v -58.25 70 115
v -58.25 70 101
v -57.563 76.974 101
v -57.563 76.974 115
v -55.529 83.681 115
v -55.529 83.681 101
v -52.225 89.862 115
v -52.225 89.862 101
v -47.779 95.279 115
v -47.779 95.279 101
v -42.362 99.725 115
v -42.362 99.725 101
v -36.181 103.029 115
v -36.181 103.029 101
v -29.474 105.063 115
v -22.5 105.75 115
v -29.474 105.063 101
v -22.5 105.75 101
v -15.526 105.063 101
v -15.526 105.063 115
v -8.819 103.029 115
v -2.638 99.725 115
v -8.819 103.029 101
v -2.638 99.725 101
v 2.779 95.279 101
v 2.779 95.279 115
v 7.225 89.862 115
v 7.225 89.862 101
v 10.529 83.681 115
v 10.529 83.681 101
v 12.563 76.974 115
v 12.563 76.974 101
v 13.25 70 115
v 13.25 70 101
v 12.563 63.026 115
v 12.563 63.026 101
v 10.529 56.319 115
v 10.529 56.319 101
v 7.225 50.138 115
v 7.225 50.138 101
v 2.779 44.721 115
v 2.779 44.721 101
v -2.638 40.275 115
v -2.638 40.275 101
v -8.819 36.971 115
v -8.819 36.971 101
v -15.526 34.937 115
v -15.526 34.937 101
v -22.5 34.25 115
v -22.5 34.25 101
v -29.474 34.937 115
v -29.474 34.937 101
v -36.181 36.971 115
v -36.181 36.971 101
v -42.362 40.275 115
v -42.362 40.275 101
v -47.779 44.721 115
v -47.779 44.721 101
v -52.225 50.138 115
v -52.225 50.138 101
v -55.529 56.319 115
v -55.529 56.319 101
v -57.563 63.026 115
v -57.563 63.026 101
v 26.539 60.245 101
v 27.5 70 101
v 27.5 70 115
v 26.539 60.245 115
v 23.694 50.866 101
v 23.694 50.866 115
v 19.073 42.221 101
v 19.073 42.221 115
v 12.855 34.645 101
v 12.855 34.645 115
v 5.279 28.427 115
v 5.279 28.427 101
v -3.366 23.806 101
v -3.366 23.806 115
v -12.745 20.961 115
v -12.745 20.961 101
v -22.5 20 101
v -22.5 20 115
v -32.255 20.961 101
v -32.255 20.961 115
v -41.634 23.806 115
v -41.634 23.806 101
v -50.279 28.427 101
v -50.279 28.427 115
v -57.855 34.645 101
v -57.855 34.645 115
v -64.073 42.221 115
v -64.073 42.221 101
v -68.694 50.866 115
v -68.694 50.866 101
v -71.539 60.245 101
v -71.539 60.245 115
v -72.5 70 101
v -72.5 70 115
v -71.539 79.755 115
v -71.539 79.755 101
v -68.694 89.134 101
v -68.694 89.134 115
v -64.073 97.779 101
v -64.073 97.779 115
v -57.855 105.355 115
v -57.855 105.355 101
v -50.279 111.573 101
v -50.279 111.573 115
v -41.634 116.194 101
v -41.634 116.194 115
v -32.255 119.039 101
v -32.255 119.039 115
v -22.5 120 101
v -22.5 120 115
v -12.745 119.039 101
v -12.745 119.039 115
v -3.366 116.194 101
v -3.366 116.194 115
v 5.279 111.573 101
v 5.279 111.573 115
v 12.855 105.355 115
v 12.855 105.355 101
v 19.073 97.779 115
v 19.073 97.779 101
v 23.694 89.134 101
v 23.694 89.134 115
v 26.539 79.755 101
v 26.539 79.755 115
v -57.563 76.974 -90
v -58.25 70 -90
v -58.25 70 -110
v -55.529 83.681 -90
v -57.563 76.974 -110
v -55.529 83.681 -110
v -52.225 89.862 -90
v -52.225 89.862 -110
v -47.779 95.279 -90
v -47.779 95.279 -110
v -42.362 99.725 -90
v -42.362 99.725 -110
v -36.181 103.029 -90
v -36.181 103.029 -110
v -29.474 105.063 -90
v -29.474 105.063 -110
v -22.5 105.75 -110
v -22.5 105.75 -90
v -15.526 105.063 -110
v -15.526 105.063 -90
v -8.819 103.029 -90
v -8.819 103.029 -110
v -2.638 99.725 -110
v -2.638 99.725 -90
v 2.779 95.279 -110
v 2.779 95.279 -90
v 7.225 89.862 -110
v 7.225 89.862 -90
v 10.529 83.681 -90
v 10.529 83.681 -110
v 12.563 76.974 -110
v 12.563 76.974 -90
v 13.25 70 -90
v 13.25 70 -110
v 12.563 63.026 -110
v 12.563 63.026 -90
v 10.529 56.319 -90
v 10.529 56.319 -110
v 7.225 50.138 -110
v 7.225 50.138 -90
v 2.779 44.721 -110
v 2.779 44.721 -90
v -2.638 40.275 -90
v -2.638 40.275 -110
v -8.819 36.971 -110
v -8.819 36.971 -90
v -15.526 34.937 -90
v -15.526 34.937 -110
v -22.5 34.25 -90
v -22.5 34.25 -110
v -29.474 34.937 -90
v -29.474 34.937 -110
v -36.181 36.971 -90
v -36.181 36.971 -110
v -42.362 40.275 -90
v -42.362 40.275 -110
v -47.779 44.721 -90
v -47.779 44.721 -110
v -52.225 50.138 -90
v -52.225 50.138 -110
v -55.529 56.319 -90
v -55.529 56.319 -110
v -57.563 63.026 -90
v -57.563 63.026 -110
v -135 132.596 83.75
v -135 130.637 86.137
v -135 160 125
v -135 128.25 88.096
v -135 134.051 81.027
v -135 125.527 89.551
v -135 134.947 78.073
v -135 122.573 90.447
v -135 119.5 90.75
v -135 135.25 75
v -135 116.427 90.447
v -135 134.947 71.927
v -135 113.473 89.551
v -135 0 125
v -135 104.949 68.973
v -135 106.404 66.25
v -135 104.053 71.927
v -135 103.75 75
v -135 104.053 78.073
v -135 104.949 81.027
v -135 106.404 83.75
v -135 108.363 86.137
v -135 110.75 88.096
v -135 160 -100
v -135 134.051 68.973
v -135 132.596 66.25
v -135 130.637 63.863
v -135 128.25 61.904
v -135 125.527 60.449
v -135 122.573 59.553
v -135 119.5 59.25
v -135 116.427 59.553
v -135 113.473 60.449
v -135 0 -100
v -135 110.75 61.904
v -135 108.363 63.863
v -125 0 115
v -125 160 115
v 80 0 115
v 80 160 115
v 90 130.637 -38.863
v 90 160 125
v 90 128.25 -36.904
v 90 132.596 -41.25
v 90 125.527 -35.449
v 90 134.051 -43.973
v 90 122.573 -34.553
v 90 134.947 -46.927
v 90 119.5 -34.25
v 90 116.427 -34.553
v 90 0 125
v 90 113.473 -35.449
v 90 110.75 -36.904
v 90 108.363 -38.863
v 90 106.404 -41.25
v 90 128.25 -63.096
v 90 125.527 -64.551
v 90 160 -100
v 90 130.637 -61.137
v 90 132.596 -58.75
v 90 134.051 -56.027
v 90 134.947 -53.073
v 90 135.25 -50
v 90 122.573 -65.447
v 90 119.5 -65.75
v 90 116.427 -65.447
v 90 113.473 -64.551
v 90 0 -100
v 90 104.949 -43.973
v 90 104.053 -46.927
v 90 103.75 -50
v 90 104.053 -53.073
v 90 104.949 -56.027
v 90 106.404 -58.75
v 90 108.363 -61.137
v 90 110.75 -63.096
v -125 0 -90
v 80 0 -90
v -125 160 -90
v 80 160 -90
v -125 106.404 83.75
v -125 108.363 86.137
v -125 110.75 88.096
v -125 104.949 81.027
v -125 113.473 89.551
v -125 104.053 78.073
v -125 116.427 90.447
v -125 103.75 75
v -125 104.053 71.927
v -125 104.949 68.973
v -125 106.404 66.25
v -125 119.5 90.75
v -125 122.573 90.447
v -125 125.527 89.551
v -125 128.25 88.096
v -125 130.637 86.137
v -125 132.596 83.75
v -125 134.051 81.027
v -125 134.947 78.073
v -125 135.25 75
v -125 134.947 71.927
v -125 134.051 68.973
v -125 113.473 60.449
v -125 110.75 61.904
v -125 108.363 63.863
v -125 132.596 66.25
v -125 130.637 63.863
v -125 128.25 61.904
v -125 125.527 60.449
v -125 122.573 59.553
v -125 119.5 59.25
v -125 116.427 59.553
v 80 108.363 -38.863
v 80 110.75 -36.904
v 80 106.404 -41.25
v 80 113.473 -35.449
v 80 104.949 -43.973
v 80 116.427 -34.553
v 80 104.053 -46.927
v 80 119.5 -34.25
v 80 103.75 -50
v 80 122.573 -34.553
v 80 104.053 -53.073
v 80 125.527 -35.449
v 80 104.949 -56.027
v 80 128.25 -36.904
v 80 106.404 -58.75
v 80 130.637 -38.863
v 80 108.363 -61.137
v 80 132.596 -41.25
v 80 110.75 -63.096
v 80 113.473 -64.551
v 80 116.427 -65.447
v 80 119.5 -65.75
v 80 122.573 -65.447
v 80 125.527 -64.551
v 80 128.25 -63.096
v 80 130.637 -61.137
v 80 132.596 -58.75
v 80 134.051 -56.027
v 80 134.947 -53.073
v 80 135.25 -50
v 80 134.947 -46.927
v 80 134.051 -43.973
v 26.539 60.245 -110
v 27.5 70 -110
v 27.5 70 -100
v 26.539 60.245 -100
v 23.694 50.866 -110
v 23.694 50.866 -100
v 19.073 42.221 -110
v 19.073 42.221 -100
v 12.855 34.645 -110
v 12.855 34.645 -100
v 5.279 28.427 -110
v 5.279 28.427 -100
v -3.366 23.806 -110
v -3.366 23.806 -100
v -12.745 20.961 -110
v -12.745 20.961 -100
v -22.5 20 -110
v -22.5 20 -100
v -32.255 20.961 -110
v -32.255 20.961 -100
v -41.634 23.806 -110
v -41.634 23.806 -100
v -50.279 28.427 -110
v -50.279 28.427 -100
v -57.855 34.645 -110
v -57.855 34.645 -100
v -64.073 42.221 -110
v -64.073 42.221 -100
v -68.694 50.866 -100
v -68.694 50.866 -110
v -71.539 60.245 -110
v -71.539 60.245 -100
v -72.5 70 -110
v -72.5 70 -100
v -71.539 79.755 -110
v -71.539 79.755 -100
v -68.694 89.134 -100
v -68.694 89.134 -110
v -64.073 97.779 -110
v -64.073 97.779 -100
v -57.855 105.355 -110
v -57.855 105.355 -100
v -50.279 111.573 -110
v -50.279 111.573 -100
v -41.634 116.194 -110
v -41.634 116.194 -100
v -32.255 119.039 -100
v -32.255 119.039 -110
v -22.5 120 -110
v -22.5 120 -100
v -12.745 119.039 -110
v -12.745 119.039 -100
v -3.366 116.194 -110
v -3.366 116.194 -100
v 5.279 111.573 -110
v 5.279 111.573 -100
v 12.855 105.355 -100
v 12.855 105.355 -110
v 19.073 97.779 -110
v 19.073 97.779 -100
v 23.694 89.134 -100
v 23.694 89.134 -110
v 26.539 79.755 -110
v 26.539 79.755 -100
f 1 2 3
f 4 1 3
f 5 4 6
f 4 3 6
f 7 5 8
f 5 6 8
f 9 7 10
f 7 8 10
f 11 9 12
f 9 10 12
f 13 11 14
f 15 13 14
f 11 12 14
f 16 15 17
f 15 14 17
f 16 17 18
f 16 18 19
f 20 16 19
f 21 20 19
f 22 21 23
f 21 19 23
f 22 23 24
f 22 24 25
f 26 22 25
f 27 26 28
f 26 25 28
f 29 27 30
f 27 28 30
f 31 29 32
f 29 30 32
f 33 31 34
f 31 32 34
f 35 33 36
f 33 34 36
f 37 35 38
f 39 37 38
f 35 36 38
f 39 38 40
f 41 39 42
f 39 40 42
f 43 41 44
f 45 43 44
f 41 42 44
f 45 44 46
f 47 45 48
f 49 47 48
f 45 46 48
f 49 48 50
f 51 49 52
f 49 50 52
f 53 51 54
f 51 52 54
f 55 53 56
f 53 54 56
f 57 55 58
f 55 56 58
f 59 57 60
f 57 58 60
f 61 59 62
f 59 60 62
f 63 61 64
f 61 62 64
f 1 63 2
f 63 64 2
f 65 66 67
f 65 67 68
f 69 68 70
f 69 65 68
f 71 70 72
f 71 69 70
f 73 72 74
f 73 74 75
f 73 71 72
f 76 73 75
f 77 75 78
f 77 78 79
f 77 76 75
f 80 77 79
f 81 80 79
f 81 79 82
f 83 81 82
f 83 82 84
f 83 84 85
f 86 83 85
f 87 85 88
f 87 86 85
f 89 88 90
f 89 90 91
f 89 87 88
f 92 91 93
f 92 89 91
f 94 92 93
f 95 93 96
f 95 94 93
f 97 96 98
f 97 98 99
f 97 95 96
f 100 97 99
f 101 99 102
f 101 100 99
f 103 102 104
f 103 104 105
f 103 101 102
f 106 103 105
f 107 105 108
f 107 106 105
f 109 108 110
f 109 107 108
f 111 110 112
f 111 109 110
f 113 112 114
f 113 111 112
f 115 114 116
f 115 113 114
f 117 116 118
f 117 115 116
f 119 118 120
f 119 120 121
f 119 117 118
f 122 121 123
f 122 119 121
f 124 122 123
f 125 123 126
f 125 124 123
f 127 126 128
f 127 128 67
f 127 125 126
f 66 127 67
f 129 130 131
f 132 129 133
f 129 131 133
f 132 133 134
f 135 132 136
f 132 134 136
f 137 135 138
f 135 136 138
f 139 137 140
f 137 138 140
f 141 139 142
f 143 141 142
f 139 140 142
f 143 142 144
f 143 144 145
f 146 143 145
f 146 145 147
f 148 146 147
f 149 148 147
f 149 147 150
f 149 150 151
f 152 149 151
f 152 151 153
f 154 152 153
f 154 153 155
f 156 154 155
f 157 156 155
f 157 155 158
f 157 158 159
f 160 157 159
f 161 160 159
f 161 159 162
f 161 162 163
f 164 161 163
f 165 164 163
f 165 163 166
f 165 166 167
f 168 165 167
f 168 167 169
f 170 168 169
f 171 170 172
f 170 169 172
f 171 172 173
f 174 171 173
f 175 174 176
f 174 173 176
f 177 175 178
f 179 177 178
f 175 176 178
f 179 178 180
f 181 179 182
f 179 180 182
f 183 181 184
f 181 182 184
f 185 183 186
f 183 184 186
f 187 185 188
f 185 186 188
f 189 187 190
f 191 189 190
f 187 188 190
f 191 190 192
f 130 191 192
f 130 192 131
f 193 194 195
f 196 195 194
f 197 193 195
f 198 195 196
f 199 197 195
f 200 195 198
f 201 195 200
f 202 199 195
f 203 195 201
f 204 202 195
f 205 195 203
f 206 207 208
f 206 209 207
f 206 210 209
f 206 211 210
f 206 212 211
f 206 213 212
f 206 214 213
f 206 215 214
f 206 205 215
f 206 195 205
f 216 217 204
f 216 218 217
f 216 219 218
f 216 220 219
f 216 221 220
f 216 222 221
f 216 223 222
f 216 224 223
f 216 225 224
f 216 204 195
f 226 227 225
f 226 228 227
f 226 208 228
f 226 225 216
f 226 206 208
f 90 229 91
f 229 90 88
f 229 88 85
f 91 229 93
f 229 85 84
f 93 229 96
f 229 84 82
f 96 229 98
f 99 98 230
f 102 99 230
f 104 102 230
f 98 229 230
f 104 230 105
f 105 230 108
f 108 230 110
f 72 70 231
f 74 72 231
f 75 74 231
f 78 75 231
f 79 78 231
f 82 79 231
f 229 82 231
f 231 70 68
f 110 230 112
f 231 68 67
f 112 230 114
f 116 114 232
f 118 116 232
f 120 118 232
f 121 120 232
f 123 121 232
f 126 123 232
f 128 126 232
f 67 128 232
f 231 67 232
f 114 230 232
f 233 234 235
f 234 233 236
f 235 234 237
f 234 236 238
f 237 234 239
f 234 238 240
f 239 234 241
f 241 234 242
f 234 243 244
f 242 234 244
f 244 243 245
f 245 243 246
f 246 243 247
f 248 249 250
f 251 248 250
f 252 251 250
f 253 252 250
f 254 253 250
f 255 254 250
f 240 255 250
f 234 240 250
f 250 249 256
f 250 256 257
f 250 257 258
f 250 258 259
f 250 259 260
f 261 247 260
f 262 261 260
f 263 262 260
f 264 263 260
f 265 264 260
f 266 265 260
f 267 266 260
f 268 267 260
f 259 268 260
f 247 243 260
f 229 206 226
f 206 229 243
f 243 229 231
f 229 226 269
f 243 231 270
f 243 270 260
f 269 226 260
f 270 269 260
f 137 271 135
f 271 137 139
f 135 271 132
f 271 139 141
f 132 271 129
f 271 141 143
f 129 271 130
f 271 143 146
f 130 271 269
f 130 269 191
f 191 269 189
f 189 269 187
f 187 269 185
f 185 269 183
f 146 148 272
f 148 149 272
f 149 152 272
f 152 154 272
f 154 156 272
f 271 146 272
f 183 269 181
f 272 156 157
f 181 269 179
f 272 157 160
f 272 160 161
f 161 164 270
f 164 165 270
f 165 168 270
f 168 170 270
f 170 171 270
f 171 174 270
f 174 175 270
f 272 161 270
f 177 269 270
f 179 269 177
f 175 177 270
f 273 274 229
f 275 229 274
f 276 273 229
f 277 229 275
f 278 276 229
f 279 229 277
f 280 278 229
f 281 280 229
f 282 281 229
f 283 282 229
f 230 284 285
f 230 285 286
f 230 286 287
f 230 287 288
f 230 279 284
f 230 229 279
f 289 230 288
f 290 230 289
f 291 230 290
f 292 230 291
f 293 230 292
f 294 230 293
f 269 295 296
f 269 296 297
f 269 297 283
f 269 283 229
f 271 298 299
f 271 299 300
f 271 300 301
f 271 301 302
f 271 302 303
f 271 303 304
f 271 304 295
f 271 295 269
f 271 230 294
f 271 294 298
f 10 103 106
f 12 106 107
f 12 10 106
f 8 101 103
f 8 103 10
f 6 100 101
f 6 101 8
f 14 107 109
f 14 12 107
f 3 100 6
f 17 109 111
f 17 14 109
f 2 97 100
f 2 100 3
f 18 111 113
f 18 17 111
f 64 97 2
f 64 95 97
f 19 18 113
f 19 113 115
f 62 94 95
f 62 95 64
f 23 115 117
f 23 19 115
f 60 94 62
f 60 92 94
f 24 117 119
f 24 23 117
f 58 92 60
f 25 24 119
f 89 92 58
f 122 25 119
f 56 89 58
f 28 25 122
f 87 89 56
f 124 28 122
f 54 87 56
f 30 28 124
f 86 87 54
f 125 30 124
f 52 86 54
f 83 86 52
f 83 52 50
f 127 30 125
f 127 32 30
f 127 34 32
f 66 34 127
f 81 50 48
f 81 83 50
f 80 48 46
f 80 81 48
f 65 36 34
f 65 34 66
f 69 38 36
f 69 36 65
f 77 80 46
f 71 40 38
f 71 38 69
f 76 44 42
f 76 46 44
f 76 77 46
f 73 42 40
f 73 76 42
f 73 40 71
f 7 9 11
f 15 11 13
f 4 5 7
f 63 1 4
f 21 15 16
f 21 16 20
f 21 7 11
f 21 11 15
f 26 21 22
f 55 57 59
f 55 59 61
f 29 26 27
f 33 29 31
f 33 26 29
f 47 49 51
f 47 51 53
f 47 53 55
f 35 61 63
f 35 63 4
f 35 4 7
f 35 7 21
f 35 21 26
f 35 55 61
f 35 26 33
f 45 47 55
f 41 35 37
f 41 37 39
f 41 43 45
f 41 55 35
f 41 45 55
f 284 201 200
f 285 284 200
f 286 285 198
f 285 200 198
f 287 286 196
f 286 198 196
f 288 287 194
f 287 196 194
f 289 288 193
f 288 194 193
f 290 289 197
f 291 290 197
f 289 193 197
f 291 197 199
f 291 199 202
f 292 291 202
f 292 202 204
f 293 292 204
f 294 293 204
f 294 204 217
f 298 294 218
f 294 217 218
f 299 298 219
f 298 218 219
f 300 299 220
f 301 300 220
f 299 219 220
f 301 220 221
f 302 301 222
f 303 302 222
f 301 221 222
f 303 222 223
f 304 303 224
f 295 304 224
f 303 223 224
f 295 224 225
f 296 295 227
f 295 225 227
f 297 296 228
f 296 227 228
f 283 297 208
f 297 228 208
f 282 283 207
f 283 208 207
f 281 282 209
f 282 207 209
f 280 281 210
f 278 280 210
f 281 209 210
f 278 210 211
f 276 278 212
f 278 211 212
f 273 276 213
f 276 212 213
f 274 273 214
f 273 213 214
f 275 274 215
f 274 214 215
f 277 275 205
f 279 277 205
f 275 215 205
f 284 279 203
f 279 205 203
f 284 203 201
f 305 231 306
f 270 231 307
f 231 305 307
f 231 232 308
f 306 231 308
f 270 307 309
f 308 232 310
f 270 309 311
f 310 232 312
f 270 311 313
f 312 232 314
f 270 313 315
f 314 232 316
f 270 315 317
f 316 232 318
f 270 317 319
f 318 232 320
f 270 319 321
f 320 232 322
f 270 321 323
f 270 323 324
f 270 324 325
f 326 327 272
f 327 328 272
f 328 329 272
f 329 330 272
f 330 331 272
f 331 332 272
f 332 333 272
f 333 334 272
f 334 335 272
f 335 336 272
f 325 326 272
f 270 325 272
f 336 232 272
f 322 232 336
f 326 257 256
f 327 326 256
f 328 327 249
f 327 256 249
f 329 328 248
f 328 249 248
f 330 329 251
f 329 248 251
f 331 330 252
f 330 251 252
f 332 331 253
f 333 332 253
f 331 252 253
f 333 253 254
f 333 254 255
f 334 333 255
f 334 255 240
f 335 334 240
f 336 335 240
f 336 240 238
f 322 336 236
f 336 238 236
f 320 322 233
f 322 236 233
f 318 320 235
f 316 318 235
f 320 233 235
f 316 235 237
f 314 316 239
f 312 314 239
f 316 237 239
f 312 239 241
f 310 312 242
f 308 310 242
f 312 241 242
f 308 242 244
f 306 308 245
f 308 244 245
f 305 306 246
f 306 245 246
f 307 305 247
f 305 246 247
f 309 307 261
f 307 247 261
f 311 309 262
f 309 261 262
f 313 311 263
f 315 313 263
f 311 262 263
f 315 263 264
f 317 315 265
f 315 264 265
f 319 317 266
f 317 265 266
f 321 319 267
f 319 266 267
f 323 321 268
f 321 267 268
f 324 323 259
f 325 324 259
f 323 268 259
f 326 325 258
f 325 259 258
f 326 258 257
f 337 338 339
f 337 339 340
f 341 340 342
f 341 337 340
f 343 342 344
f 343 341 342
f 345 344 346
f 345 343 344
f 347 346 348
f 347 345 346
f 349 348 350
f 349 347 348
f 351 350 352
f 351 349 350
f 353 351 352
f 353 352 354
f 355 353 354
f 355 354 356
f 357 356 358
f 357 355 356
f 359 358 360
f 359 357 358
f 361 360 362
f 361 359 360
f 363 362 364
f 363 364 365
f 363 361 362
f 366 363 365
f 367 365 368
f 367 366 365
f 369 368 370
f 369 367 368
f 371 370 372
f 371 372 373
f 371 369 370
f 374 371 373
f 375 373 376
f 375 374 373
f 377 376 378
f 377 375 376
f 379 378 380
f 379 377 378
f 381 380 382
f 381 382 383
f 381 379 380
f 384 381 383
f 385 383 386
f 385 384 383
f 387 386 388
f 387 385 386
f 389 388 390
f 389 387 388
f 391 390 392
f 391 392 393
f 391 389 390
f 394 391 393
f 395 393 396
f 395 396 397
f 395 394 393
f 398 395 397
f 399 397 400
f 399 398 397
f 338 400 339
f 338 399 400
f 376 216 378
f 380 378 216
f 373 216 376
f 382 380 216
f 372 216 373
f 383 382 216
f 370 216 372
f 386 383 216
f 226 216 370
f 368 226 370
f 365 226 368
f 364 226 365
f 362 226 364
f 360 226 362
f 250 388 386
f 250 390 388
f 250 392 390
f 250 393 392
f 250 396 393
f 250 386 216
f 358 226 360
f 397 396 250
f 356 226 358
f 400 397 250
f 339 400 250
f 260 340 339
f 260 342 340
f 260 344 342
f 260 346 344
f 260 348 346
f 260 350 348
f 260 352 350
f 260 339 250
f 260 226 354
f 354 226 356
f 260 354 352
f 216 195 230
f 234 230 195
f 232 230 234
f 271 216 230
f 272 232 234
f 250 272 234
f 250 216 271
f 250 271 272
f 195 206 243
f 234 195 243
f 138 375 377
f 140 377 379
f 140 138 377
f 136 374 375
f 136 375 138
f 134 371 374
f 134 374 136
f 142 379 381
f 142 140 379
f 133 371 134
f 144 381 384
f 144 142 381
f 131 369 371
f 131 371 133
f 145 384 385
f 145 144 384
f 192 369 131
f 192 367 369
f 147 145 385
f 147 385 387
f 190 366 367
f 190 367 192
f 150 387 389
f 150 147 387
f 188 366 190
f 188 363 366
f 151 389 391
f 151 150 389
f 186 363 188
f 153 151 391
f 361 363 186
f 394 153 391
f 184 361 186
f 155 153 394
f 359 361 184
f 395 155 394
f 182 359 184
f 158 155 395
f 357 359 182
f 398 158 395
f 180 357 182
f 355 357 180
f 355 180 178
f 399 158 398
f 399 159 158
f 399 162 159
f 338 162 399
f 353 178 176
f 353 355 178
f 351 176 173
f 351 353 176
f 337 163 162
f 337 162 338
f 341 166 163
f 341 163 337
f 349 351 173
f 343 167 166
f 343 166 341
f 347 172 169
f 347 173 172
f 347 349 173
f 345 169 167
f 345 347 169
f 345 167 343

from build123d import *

# Parameters (mm, degrees)
SKETCH1_W           = 225
SKETCH1_H           = 225
SKETCH1_W_2         = 205
SKETCH1_H_2         = 205
WALLS_DEPTH         = 160
SKETCH1_5_W         = 205
SKETCH1_5_H         = 205
BOSS_EXTRUDE2_DEPTH = 7
SKETCH2_R           = 35.75
CUT_EXTRUDE1_DEPTH  = 197
BOSS_EXTRUDE3_START = 14
SKETCH6_R           = 50
SKETCH6_R_2         = 35.75
BOSS_EXTRUDE3_DEPTH = 14
BOSS_EXTRUDE4_START = 10
SKETCH7_R           = 50
SKETCH7_R_2         = 35.75
BOSS_EXTRUDE4_DEPTH = 10
SKETCH9_W           = 205
SKETCH9_H           = 205
CUT_EXTRUDE4_DEPTH  = 10
SKETCH10_R          = 15.75
CUT_EXTRUDE6_DEPTH  = 10
SKETCH11_R          = 15.75
CUT_EXTRUDE7_DEPTH  = 10


with BuildPart() as part:
    # Sketch1 → Walls (new body)
    with BuildSketch(Plane(origin=(0, 0, 0), x_dir=(1, 0, 0), z_dir=(0, 1, 0))):
        with Locations((-22.5, -12.5)):
            Rectangle(SKETCH1_W, SKETCH1_H)
        with Locations((-22.5, -12.5)):
            Rectangle(SKETCH1_W_2, SKETCH1_H_2, mode=Mode.SUBTRACT)
    extrude(amount=WALLS_DEPTH)

    # Sketch1<5> → Boss-Extrude2 (add)
    with BuildSketch(Plane(origin=(0, 0, 0), x_dir=(1, 0, 0), z_dir=(0, 1, 0))):
        with Locations((-22.5, -12.5)):
            Rectangle(SKETCH1_5_W, SKETCH1_5_H)
    extrude(amount=BOSS_EXTRUDE2_DEPTH)

    # Sketch2 → Cut-Extrude1 (cut)
    with BuildSketch(Plane(origin=(0, 0, -100), x_dir=(-1, 0, 0), z_dir=(0, 0, -1))):
        with Locations((22.5, 70)):
            Circle(SKETCH2_R)
    extrude(amount=-CUT_EXTRUDE1_DEPTH, mode=Mode.SUBTRACT)

    # Sketch6 → Boss-Extrude3 (add)
    with BuildSketch(Plane(origin=(0, 0, 115), x_dir=(-1, 0, 0), z_dir=(0, 0, -1)).offset(BOSS_EXTRUDE3_START)):
        with Locations((22.5, 70)):
            Circle(SKETCH6_R)
        with Locations((22.5, 70)):
            Circle(SKETCH6_R_2, mode=Mode.SUBTRACT)
    extrude(amount=-BOSS_EXTRUDE3_DEPTH)

    # Sketch7 → Boss-Extrude4 (add)
    with BuildSketch(Plane(origin=(0, 0, -100), x_dir=(-1, 0, 0), z_dir=(0, 0, -1)).offset(BOSS_EXTRUDE4_START)):
        with Locations((22.5, 70)):
            Circle(SKETCH7_R)
        with Locations((22.5, 70)):
            Circle(SKETCH7_R_2, mode=Mode.SUBTRACT)
    extrude(amount=-BOSS_EXTRUDE4_DEPTH)

    # Sketch9 → Cut-Extrude4 (cut)
    with BuildSketch(Plane(origin=(0, 7, 0), x_dir=(1, 0, 0), z_dir=(0, 1, 0))):
        with Locations((-22.5, -12.5)):
            Rectangle(SKETCH9_W, SKETCH9_H)
    extrude(amount=-CUT_EXTRUDE4_DEPTH, mode=Mode.SUBTRACT)

    # Sketch10 → Cut-Extrude6 (cut)
    with BuildSketch(Plane.ZY.offset(135)):
        with Locations((75, 119.5)):
            Circle(SKETCH10_R)
    extrude(amount=-CUT_EXTRUDE6_DEPTH, mode=Mode.SUBTRACT)

    # Sketch11 → Cut-Extrude7 (cut)
    with BuildSketch(Plane(origin=(90, 0, 0), x_dir=(0, 0, -1), z_dir=(1, 0, 0))):
        with Locations((50, 119.5)):
            Circle(SKETCH11_R)
    extrude(amount=-CUT_EXTRUDE7_DEPTH, mode=Mode.SUBTRACT)


solid = part.part
